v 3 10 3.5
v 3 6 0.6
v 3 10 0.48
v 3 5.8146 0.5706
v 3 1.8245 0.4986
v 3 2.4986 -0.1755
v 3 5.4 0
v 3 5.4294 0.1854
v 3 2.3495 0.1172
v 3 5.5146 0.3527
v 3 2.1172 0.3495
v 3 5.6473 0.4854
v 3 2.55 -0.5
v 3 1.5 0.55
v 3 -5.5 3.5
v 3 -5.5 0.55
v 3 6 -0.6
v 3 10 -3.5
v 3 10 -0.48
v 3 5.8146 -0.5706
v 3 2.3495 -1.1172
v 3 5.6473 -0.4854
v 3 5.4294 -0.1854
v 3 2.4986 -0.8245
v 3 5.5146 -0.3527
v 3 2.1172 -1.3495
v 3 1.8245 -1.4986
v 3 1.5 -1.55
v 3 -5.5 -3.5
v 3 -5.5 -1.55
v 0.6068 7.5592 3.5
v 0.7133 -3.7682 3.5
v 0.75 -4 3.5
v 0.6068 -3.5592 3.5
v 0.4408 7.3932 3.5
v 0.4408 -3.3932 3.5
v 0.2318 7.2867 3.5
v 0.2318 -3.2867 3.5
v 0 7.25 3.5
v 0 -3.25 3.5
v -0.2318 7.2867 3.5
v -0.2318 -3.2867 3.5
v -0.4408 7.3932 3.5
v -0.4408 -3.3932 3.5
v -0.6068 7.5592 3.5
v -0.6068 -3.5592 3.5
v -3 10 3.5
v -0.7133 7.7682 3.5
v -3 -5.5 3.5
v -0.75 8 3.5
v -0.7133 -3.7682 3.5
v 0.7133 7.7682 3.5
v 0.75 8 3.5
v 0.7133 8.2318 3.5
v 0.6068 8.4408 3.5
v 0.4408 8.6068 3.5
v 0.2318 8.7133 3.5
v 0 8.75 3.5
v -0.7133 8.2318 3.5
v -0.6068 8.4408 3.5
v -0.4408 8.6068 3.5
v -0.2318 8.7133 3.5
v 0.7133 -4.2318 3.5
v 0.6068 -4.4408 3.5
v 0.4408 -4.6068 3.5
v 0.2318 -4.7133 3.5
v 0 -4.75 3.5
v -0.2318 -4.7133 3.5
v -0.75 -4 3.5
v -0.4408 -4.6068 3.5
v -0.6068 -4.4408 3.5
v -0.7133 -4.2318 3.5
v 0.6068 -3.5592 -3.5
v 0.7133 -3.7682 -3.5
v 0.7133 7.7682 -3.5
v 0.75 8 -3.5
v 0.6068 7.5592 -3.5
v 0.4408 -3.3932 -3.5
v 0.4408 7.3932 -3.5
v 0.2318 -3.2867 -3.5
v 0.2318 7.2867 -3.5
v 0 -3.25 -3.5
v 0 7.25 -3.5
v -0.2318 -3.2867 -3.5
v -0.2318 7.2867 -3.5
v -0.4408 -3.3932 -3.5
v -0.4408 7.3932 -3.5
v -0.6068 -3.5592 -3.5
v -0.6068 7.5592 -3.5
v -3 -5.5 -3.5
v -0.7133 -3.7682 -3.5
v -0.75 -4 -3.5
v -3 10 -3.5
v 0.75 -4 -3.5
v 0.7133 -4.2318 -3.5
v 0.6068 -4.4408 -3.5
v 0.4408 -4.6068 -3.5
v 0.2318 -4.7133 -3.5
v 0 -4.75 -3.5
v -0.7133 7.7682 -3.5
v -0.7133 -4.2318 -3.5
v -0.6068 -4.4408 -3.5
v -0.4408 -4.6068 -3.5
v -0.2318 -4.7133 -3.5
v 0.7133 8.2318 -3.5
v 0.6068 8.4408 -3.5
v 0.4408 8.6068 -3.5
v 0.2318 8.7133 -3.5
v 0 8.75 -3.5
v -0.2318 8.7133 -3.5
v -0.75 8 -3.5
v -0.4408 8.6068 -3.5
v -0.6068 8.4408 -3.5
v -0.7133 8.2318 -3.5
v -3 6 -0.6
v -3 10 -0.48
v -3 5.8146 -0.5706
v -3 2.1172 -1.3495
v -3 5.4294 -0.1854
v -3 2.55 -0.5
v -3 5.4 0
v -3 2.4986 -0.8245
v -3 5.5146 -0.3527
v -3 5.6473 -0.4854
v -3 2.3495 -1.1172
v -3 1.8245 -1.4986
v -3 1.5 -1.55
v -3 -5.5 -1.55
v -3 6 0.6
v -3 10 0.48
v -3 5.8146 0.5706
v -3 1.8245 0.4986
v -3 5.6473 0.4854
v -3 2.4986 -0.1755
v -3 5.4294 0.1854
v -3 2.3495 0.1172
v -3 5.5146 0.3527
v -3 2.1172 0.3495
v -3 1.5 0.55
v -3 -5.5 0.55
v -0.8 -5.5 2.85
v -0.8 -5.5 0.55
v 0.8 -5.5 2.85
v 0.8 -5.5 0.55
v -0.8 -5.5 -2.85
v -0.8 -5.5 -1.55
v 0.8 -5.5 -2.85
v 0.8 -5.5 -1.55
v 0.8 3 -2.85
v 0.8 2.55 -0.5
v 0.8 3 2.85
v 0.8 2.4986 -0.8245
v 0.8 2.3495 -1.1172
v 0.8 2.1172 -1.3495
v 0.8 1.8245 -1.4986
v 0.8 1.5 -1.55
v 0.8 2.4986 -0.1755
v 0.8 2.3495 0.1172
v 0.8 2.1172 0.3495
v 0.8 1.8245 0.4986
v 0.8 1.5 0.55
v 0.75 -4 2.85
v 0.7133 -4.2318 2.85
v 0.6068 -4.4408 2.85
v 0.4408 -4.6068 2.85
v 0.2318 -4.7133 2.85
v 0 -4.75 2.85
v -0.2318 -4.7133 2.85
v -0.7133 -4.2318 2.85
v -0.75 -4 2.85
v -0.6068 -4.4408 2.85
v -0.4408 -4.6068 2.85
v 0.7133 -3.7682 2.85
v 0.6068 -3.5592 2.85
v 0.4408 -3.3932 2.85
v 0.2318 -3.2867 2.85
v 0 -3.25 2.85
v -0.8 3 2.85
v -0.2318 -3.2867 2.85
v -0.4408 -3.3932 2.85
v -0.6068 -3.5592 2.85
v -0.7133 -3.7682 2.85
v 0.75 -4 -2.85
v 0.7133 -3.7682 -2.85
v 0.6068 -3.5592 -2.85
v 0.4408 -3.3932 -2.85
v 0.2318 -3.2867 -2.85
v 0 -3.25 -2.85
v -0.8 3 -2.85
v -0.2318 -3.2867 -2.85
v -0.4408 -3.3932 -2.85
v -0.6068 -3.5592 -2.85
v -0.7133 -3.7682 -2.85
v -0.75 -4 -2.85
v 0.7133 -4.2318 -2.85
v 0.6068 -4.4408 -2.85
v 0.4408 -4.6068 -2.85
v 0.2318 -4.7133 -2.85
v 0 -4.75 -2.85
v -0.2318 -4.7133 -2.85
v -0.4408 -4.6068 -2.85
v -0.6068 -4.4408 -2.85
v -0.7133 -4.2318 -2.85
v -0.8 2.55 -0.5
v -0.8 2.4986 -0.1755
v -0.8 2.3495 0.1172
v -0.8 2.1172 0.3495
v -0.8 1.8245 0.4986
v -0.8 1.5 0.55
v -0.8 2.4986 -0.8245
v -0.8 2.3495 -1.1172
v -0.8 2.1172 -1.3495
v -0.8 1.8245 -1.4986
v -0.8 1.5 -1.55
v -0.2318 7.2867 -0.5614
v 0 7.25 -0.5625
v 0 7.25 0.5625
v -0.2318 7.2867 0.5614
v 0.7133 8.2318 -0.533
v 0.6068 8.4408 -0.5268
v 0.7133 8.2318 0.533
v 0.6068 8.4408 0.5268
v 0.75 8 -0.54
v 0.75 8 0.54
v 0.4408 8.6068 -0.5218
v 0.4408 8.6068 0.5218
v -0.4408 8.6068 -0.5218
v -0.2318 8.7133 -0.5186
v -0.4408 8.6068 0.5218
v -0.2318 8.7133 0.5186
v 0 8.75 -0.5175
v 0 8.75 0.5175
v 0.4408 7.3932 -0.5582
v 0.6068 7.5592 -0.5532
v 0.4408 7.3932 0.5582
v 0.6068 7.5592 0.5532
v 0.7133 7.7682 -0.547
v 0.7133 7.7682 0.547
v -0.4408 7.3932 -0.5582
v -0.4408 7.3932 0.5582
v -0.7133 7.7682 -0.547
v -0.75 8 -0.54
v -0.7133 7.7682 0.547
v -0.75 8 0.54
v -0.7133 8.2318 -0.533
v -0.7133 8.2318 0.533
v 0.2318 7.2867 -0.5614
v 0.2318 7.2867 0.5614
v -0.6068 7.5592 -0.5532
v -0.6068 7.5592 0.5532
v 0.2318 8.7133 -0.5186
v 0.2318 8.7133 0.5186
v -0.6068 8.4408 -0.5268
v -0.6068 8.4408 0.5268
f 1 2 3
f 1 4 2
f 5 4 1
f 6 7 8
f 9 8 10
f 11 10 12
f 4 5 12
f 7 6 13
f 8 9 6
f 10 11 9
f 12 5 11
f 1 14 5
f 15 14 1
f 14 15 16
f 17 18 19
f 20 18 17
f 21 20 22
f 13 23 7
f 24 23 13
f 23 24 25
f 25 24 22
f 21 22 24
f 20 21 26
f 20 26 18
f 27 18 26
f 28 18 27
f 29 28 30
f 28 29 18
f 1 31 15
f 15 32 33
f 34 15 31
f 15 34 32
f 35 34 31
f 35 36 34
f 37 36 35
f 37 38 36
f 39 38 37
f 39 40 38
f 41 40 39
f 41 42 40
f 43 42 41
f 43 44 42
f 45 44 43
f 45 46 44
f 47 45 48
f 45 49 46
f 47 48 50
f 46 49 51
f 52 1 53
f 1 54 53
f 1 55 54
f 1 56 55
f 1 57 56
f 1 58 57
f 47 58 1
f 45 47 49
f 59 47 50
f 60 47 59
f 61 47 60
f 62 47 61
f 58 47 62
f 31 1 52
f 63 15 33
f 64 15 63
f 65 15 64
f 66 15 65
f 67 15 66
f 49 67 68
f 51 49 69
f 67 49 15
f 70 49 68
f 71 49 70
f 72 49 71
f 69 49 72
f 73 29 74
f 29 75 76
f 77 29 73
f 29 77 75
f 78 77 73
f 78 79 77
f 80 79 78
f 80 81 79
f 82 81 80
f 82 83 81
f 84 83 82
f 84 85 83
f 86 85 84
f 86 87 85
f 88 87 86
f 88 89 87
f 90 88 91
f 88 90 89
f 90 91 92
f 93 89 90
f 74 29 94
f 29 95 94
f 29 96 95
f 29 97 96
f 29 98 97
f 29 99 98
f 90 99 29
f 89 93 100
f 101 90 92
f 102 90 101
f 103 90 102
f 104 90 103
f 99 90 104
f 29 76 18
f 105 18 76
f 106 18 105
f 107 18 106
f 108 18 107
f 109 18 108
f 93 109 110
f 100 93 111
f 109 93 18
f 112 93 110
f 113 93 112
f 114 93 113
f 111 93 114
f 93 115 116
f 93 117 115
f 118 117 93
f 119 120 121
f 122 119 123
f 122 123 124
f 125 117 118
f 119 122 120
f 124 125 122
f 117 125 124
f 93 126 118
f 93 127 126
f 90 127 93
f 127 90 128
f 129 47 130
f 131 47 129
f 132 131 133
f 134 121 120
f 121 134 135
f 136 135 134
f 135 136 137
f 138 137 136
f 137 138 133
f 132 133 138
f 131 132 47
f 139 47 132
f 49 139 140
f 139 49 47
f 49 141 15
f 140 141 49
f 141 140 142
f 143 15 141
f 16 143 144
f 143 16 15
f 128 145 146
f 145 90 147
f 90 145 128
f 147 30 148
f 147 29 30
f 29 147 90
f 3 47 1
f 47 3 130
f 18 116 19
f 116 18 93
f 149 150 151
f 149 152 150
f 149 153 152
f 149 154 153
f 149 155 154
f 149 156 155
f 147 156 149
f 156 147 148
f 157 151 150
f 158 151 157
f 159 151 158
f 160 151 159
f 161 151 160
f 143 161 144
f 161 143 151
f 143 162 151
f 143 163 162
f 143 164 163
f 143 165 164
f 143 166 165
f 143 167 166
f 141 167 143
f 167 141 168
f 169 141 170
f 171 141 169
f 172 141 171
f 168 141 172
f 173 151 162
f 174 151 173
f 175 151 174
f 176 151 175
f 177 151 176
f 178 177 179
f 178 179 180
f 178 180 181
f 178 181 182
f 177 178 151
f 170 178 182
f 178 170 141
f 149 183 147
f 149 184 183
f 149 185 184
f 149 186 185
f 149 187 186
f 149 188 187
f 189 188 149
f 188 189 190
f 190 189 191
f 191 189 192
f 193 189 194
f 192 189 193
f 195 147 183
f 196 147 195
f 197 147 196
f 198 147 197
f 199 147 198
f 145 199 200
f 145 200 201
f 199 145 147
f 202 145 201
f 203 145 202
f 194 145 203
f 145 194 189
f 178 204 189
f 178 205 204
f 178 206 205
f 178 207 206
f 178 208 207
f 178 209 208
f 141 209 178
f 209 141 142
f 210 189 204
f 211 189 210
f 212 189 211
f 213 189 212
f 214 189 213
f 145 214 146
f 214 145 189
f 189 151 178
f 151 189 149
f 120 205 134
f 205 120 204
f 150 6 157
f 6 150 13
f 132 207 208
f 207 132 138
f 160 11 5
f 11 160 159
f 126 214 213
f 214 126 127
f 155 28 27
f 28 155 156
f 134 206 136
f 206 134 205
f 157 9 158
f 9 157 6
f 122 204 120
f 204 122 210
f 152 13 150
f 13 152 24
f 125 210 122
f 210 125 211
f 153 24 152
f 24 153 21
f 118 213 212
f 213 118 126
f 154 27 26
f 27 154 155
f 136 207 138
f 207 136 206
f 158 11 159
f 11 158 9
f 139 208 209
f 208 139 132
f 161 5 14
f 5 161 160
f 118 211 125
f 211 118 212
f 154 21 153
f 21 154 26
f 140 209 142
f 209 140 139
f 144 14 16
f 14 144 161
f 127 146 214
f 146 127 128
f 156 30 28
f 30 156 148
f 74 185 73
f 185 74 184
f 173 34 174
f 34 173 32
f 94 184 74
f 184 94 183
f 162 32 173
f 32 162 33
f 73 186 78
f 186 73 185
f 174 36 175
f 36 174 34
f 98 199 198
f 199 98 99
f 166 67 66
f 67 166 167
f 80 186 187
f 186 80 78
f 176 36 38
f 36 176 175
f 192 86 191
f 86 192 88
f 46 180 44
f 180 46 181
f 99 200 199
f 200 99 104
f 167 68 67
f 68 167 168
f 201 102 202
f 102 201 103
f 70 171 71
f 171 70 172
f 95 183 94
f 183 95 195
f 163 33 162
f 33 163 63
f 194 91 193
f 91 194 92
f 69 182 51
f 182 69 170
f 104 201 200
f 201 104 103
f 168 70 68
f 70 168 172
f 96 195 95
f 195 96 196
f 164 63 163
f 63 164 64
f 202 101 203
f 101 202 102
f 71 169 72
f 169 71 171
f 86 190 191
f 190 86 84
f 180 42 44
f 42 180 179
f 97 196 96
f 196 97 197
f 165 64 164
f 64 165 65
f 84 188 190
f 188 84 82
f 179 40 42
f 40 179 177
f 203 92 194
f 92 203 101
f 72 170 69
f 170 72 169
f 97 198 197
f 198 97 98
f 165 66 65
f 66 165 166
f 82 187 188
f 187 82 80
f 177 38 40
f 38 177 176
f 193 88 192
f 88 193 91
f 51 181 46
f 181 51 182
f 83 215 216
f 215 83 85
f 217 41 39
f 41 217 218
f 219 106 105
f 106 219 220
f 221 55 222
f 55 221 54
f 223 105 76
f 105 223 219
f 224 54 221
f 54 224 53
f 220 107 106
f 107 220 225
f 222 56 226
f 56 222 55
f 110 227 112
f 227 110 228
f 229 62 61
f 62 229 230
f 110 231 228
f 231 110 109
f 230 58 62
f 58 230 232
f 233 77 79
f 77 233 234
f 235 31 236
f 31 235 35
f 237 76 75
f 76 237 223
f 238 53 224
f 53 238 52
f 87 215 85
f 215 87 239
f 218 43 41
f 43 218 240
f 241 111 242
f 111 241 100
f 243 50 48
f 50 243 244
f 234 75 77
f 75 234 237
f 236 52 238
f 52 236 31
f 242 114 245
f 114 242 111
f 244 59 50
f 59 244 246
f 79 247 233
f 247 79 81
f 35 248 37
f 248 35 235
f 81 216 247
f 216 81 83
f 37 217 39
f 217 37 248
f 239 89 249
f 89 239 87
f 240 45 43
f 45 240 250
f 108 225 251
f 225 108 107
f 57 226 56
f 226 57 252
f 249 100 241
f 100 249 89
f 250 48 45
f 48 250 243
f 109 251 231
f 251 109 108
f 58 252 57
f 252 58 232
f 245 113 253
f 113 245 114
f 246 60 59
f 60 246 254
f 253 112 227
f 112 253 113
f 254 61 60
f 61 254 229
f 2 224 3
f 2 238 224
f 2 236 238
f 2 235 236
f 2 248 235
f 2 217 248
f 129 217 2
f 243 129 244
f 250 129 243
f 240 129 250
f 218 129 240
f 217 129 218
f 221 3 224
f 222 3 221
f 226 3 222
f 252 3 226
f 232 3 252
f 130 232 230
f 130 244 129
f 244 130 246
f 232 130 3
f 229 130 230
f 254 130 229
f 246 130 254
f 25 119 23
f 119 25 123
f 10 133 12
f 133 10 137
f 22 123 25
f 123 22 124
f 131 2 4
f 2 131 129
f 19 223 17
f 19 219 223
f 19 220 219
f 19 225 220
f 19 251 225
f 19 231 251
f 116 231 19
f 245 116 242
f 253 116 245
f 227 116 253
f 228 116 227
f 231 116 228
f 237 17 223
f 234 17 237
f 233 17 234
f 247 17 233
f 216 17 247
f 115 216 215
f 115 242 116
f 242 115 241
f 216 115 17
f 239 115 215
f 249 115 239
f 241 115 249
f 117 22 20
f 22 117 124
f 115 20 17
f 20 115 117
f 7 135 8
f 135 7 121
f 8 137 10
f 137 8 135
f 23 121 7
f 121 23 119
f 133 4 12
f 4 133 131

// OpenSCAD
DRIVEX = 1.6;
DRIVEY = 6;
DRIVEZ = 5.7;
ROD = 1.6;
SCREW = 2.1;
CABLE = 1.2;
$fn = 20;

module drive() {
    cube(center=true, [DRIVEX, DRIVEY, DRIVEZ]);
    
    translate([-5, -DRIVEY/2+.8, -.5])
        rotate([0, 90, 0])
            cylinder(d = ROD, h=10);
    
    screw();

}


module screw() {
    translate([-5, DRIVEY/2-1.5, -.5])
        rotate([0, 90, 0])
            cylinder(d = SCREW, h = 10);
}

module sleeve() {
    cube(center=true, [6, 11, 7]);
}

module neg_misc() {
    translate([0, -5, 0]) 
        cube(center=true, [DRIVEX, DRIVEY, DRIVEZ]);
    hull() {
        translate([0, -7, 0])
            screw();
        screw();
   
    }
}

module cable() {
    hull() {
        translate([-8, 6]) 
            rotate([0, 90])
                cylinder(d=CABLE, h=20);
        translate([-8, 10]) 
            rotate([0, 90])
                cylinder(d=CABLE*.8, h=20);
    }
}

module retainer() {
    //translate([-2.5, 5]) {
        //difference() {
            //rotate([0, 90])
                //cylinder(r=5, h=5);
        //}
    //}
    translate([0, 7.5])
        cube(center=true, [6,5,7]);
}

module pins() {
    translate([0, -4, -5])
        #cylinder(d=1.5, h=10);
    translate([0, 8, -5])
        #cylinder(d=1.5, h=10);
}

difference() {
    union() {
        sleeve();
        retainer();
    }
    
    #drive();
    neg_misc();
    cable();
    pins();
}
